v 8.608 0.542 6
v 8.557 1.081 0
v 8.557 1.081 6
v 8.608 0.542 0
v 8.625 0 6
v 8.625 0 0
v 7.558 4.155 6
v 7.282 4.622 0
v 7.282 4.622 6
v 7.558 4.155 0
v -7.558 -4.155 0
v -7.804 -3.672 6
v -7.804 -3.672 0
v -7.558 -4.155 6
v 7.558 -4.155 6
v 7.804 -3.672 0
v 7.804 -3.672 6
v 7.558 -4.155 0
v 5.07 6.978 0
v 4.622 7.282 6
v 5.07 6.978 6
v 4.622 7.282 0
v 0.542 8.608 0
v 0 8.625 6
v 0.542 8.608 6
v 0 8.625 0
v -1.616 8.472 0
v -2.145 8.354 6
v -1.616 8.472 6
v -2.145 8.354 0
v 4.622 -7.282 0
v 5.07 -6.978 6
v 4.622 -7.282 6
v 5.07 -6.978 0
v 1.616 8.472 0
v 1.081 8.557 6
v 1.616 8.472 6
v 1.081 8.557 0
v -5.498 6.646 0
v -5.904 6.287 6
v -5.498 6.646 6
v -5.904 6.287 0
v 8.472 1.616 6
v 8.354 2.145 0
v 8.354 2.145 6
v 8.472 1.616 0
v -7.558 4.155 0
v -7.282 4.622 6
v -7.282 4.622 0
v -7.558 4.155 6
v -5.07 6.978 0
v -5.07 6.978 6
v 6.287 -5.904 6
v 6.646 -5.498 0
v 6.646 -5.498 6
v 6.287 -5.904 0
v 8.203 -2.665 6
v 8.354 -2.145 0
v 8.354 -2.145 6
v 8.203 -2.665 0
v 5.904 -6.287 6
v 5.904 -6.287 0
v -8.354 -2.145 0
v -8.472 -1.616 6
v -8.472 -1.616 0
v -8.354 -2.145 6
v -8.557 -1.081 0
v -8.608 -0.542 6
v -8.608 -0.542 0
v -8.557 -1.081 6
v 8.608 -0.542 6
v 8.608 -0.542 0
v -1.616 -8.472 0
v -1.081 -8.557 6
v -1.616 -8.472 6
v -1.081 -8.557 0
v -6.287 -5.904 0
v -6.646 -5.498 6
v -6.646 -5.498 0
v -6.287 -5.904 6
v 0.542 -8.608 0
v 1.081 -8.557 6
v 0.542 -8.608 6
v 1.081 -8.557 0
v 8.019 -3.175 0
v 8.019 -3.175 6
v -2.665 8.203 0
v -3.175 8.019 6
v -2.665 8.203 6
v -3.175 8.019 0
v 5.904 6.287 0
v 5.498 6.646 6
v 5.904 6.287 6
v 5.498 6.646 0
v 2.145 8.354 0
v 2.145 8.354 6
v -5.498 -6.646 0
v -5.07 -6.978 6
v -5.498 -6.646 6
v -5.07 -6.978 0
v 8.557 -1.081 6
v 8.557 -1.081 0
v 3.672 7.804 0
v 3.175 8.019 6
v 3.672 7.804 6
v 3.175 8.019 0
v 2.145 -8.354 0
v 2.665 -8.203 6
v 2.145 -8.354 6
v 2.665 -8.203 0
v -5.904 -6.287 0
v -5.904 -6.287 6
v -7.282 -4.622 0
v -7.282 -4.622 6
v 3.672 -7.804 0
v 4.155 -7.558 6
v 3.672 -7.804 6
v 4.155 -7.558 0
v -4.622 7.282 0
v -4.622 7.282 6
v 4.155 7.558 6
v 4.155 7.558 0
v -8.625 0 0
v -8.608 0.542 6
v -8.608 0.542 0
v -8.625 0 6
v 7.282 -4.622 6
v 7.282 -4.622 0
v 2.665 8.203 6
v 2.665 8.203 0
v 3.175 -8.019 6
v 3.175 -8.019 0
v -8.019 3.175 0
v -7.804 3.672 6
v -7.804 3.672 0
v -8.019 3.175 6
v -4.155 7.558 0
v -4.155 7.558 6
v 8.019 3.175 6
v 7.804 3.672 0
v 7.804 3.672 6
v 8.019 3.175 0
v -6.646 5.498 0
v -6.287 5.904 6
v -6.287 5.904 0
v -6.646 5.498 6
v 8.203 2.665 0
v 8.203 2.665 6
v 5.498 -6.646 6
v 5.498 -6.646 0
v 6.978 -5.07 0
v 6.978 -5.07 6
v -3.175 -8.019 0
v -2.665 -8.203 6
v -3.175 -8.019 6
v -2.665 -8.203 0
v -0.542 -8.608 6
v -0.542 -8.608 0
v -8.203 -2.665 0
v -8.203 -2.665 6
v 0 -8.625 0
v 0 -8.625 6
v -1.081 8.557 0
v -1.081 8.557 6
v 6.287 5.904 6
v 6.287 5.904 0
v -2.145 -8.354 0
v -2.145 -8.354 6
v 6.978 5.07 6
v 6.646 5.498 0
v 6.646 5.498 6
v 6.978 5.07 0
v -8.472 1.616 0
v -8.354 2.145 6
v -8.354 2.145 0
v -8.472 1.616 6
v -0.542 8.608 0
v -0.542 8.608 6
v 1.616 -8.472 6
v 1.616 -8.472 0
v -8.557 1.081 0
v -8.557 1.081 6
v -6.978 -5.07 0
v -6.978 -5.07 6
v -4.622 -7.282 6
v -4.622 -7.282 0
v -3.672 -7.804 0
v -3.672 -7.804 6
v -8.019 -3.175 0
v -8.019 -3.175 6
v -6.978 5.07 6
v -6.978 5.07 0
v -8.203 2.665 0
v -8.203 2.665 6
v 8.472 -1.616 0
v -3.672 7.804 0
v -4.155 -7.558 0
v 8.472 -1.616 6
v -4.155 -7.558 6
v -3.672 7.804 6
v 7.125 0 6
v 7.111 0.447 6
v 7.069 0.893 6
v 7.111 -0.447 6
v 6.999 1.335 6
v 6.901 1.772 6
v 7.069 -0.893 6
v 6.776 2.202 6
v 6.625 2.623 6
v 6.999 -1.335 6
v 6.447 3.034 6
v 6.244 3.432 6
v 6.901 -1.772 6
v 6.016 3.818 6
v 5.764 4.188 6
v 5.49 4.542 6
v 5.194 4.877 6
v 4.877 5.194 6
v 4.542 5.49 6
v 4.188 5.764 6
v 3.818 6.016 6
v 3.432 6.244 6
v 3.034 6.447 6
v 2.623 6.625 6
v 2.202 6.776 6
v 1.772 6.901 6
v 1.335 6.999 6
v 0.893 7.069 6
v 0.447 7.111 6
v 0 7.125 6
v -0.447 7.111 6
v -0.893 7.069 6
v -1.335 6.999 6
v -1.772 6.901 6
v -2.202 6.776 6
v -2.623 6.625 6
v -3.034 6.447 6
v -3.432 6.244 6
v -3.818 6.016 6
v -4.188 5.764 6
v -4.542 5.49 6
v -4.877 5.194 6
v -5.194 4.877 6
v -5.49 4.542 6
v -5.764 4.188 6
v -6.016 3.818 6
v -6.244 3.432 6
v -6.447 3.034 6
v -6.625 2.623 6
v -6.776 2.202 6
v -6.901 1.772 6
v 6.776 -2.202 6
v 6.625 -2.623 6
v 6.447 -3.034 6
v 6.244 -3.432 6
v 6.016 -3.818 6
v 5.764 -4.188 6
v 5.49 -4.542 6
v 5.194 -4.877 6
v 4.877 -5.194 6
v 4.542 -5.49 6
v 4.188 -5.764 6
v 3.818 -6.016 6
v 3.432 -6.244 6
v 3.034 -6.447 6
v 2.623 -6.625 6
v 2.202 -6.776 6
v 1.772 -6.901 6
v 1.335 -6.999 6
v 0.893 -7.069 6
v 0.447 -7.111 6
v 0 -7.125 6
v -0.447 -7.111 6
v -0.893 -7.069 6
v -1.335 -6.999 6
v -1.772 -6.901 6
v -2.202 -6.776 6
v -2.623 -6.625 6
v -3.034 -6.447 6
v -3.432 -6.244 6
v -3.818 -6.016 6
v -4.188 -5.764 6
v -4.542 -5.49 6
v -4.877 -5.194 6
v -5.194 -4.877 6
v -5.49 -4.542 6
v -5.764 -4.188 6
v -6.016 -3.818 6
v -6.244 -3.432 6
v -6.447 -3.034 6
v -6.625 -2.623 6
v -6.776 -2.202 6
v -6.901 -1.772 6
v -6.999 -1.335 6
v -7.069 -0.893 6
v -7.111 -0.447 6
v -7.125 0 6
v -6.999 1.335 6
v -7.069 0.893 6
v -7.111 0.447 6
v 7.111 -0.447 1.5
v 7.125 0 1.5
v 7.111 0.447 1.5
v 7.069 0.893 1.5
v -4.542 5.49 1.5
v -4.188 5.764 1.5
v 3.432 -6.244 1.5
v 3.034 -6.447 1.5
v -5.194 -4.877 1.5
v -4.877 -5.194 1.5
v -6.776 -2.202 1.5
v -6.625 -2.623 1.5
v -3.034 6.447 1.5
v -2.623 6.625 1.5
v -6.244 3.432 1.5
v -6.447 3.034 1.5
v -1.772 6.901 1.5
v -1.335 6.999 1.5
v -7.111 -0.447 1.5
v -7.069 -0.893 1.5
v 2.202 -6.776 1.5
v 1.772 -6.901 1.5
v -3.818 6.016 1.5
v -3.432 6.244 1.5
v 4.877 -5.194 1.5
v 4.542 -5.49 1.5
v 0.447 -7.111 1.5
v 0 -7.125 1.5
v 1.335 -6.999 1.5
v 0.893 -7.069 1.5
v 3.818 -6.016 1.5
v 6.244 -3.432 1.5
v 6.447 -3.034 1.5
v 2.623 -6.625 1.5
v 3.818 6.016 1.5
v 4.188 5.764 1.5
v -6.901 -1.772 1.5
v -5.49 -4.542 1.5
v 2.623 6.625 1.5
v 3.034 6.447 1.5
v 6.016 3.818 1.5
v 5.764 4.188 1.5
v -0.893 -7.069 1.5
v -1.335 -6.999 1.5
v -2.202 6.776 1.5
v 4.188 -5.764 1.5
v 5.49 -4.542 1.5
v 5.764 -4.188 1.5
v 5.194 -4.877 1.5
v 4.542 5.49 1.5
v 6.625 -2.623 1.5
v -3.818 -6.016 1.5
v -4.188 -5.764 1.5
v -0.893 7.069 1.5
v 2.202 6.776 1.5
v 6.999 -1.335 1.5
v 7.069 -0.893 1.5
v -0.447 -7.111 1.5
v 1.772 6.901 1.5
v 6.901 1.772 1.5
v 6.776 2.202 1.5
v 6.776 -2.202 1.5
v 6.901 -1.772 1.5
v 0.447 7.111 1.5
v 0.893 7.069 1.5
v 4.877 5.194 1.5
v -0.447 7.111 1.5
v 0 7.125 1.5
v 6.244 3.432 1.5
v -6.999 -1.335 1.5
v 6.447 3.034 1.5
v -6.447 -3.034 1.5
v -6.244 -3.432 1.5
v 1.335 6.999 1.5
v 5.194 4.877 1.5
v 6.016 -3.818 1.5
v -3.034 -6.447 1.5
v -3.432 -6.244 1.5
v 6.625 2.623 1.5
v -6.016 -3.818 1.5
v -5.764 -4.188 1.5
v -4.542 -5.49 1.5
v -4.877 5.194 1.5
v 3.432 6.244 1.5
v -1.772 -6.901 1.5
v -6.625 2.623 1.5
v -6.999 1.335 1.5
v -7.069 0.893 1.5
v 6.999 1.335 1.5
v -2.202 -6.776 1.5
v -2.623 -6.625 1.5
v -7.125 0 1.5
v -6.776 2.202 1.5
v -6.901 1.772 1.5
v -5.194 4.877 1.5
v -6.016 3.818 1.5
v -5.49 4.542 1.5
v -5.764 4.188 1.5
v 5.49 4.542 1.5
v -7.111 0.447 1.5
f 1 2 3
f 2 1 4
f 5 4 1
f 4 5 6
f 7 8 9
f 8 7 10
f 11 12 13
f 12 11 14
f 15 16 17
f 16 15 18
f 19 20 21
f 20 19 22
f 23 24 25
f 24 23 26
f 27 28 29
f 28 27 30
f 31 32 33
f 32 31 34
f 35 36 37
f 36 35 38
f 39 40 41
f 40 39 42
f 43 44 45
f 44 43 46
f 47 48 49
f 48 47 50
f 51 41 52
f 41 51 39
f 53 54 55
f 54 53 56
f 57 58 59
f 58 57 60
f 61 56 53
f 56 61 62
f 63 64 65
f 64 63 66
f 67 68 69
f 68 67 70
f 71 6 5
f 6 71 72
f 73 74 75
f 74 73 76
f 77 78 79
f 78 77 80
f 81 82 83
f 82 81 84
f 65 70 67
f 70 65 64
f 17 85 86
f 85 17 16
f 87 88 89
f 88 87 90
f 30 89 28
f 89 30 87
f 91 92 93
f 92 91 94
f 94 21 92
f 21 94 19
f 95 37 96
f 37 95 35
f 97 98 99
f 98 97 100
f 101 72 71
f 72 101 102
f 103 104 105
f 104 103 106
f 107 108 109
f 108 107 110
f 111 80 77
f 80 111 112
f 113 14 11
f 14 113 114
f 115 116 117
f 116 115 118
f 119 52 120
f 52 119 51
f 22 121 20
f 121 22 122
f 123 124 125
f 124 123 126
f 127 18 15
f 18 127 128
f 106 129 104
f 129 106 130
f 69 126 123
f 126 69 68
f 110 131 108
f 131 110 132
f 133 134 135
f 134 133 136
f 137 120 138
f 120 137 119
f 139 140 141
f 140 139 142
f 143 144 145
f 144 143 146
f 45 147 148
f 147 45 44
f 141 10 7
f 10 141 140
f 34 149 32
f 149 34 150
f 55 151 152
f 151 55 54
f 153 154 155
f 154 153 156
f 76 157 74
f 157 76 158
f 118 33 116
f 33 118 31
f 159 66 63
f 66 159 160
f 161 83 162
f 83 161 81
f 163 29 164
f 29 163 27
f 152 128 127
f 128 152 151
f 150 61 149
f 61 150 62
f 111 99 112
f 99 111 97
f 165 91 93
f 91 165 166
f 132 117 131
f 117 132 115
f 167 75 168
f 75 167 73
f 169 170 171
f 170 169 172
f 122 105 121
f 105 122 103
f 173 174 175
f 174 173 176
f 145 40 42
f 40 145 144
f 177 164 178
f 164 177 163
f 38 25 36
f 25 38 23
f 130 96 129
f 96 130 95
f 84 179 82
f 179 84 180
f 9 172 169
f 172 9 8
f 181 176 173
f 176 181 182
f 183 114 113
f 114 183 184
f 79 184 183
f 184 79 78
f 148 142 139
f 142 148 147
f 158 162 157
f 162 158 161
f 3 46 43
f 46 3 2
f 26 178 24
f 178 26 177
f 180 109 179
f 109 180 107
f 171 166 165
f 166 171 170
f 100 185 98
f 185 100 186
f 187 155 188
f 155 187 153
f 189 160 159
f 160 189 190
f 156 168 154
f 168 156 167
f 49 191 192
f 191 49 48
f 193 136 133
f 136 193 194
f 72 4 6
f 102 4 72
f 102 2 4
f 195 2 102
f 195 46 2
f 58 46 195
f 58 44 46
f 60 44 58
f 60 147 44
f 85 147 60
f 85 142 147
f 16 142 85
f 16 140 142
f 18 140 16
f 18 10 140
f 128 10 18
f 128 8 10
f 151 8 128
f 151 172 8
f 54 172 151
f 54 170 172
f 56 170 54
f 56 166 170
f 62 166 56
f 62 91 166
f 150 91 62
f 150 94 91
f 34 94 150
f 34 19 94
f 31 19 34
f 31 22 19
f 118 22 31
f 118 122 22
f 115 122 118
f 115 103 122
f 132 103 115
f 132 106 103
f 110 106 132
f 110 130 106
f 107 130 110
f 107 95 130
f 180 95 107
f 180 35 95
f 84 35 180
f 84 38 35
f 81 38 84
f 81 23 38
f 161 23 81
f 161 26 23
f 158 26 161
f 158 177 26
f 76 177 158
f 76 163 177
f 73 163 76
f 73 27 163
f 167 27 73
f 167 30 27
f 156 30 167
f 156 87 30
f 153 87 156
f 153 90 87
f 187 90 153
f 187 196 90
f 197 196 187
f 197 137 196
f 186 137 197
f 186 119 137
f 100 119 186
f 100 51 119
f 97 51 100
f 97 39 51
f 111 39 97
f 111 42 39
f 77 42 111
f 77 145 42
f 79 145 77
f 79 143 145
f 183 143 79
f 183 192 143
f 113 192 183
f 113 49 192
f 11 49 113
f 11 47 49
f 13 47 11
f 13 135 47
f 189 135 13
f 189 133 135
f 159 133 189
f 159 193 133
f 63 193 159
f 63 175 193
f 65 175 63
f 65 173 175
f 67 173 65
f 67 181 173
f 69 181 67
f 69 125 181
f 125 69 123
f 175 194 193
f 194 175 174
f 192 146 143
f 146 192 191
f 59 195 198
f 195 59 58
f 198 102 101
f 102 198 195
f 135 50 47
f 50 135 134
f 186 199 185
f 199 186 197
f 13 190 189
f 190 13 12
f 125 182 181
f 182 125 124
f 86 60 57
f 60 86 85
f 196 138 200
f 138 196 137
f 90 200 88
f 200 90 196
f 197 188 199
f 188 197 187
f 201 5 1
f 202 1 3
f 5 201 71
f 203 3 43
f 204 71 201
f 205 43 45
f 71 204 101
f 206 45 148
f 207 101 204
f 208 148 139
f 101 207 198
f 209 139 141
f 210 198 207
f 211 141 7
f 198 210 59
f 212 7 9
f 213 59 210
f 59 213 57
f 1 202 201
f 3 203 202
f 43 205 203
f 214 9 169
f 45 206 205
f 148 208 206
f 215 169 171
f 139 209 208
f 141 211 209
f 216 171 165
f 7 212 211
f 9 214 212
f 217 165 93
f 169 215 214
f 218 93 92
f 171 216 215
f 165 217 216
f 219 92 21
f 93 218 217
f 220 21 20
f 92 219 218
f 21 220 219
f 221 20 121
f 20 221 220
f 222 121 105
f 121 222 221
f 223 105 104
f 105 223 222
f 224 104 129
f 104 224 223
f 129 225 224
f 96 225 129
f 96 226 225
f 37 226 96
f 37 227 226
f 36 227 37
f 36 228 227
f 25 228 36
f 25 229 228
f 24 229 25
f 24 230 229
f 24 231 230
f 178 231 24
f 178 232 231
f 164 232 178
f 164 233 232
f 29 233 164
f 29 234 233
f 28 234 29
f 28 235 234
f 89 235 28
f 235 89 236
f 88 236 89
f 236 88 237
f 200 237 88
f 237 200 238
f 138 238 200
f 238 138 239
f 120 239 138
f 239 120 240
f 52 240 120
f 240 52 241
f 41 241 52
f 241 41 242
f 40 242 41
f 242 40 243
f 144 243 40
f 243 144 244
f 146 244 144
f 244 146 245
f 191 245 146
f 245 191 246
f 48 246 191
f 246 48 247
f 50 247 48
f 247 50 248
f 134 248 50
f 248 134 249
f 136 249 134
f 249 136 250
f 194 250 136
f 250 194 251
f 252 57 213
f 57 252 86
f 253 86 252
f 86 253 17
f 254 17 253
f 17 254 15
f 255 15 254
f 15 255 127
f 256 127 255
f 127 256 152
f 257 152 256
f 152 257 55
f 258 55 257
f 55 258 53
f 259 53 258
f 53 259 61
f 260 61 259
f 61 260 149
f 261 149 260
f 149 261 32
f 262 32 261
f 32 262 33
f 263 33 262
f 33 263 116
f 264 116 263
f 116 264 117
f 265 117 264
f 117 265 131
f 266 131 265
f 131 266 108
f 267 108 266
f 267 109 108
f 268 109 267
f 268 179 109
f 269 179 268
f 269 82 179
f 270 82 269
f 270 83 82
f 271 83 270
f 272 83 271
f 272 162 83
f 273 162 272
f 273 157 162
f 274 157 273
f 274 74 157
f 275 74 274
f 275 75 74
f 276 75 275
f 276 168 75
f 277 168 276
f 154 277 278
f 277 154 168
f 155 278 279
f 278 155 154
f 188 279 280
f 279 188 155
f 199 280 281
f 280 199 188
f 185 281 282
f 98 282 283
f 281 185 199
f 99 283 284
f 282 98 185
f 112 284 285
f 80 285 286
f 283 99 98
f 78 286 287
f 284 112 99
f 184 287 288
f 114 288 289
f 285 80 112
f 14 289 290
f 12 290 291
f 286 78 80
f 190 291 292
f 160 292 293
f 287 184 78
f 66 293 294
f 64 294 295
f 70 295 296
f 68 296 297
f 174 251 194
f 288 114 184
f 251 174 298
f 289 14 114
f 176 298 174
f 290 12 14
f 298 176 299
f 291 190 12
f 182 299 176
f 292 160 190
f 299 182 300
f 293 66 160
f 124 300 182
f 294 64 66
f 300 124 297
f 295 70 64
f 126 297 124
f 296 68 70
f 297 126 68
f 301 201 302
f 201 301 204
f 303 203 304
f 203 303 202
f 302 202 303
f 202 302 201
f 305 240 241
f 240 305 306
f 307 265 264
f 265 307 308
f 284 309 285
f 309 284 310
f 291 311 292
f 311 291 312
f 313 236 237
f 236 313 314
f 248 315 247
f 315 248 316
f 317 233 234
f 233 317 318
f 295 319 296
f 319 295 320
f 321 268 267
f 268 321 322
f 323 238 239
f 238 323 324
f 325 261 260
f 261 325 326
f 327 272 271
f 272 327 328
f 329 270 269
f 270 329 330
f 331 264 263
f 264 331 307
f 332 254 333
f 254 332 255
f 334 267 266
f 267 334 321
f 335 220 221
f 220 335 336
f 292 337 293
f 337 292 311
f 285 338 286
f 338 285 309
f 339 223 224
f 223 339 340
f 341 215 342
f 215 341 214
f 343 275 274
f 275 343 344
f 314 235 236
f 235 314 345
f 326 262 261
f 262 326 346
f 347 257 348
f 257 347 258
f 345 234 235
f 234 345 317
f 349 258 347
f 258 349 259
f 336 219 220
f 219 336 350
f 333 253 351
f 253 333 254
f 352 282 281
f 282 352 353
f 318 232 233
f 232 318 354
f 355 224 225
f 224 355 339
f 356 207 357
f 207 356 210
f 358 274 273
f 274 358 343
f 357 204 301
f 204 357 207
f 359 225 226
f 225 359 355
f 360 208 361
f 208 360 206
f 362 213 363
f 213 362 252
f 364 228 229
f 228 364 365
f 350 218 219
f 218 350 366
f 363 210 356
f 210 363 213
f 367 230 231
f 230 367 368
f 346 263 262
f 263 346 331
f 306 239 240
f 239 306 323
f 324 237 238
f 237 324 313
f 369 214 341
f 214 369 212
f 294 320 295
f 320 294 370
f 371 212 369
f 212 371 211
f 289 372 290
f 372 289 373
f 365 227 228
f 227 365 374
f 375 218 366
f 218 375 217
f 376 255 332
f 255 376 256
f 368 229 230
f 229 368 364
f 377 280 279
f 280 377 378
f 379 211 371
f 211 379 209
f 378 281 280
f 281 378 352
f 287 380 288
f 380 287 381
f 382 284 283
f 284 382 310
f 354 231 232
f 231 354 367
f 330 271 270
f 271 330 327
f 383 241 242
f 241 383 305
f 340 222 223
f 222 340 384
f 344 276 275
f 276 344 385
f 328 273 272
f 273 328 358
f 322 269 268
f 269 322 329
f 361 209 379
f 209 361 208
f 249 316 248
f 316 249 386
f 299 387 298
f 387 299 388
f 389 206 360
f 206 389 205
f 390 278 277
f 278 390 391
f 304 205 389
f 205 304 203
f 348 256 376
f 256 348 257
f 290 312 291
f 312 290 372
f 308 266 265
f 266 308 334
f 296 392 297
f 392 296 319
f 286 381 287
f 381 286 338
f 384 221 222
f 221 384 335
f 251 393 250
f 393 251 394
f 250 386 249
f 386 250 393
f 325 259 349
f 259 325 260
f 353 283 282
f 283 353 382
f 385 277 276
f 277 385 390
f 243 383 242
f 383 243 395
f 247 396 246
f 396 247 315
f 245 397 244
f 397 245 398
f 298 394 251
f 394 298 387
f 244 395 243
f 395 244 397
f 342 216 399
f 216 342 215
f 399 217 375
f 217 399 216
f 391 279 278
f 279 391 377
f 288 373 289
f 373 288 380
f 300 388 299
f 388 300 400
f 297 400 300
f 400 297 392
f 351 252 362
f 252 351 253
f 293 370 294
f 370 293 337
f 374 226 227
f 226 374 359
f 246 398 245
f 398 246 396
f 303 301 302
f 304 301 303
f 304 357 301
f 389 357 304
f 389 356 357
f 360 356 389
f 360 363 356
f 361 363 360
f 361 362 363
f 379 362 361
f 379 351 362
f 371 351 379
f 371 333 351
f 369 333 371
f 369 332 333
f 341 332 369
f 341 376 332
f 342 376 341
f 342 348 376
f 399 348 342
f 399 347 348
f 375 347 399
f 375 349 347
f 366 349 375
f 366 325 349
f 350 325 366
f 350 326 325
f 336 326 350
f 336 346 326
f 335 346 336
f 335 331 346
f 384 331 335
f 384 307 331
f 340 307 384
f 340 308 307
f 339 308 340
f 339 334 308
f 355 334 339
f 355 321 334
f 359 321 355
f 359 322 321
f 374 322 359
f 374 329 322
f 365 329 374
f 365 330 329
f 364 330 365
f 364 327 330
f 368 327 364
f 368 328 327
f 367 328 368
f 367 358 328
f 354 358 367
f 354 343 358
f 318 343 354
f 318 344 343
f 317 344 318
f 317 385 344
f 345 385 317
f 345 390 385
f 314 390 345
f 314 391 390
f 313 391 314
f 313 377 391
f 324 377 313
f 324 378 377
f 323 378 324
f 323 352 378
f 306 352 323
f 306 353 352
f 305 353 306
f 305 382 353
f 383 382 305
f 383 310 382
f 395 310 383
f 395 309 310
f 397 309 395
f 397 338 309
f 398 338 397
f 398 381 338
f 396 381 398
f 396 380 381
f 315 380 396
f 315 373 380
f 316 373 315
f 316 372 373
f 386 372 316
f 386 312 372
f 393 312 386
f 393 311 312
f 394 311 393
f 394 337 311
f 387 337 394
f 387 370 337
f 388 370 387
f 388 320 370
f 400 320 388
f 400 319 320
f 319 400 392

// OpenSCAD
//Parameterised push on lens cap
// Glyn Cowles July 2014
// Added option to have a place for a tether
// Scott Hergott September 2014

//Thickness of sides
thickness=1.5;//[1:5] 
//Inside diameter
idiam=14;//[10:200]   
//Height
lidh=6;//[2:20]
//Looseness factor (5 = extra .5mm + diameter)
looseness=2.5;//[0:20]
// Toggle for tether
doTether= 0; // ["true","false"]

/* [Hidden] */
$fn=100;
loose=looseness/10; // ie looseness = 5 loose = 0.5mm


lid(); 

//-----------------------------------------------------------------------
module tube(d,h,th) {  // d= outside diam
rad=d/2;
difference() {
	cylinder(h=h,r=rad);
	cylinder(h=h,r=rad-th);
	}
}

module tether( edge ) {
translate([-(edge+1)/2, 0, 0])
difference() {
	cylinder(h=thickness,r=4, center=false);
	cylinder(h=thickness,r=2, center=false);
	}
}

//-----------------------------------------------------------------------

module lid(){
union() {
	tube(idiam+thickness*2+loose,lidh,thickness); // sides
	tube(idiam+thickness*2+loose,thickness,idiam+thickness*2+loose); // base
	if (doTether)
	{
		tether(idiam+thickness/2+loose);
	}
}
}
